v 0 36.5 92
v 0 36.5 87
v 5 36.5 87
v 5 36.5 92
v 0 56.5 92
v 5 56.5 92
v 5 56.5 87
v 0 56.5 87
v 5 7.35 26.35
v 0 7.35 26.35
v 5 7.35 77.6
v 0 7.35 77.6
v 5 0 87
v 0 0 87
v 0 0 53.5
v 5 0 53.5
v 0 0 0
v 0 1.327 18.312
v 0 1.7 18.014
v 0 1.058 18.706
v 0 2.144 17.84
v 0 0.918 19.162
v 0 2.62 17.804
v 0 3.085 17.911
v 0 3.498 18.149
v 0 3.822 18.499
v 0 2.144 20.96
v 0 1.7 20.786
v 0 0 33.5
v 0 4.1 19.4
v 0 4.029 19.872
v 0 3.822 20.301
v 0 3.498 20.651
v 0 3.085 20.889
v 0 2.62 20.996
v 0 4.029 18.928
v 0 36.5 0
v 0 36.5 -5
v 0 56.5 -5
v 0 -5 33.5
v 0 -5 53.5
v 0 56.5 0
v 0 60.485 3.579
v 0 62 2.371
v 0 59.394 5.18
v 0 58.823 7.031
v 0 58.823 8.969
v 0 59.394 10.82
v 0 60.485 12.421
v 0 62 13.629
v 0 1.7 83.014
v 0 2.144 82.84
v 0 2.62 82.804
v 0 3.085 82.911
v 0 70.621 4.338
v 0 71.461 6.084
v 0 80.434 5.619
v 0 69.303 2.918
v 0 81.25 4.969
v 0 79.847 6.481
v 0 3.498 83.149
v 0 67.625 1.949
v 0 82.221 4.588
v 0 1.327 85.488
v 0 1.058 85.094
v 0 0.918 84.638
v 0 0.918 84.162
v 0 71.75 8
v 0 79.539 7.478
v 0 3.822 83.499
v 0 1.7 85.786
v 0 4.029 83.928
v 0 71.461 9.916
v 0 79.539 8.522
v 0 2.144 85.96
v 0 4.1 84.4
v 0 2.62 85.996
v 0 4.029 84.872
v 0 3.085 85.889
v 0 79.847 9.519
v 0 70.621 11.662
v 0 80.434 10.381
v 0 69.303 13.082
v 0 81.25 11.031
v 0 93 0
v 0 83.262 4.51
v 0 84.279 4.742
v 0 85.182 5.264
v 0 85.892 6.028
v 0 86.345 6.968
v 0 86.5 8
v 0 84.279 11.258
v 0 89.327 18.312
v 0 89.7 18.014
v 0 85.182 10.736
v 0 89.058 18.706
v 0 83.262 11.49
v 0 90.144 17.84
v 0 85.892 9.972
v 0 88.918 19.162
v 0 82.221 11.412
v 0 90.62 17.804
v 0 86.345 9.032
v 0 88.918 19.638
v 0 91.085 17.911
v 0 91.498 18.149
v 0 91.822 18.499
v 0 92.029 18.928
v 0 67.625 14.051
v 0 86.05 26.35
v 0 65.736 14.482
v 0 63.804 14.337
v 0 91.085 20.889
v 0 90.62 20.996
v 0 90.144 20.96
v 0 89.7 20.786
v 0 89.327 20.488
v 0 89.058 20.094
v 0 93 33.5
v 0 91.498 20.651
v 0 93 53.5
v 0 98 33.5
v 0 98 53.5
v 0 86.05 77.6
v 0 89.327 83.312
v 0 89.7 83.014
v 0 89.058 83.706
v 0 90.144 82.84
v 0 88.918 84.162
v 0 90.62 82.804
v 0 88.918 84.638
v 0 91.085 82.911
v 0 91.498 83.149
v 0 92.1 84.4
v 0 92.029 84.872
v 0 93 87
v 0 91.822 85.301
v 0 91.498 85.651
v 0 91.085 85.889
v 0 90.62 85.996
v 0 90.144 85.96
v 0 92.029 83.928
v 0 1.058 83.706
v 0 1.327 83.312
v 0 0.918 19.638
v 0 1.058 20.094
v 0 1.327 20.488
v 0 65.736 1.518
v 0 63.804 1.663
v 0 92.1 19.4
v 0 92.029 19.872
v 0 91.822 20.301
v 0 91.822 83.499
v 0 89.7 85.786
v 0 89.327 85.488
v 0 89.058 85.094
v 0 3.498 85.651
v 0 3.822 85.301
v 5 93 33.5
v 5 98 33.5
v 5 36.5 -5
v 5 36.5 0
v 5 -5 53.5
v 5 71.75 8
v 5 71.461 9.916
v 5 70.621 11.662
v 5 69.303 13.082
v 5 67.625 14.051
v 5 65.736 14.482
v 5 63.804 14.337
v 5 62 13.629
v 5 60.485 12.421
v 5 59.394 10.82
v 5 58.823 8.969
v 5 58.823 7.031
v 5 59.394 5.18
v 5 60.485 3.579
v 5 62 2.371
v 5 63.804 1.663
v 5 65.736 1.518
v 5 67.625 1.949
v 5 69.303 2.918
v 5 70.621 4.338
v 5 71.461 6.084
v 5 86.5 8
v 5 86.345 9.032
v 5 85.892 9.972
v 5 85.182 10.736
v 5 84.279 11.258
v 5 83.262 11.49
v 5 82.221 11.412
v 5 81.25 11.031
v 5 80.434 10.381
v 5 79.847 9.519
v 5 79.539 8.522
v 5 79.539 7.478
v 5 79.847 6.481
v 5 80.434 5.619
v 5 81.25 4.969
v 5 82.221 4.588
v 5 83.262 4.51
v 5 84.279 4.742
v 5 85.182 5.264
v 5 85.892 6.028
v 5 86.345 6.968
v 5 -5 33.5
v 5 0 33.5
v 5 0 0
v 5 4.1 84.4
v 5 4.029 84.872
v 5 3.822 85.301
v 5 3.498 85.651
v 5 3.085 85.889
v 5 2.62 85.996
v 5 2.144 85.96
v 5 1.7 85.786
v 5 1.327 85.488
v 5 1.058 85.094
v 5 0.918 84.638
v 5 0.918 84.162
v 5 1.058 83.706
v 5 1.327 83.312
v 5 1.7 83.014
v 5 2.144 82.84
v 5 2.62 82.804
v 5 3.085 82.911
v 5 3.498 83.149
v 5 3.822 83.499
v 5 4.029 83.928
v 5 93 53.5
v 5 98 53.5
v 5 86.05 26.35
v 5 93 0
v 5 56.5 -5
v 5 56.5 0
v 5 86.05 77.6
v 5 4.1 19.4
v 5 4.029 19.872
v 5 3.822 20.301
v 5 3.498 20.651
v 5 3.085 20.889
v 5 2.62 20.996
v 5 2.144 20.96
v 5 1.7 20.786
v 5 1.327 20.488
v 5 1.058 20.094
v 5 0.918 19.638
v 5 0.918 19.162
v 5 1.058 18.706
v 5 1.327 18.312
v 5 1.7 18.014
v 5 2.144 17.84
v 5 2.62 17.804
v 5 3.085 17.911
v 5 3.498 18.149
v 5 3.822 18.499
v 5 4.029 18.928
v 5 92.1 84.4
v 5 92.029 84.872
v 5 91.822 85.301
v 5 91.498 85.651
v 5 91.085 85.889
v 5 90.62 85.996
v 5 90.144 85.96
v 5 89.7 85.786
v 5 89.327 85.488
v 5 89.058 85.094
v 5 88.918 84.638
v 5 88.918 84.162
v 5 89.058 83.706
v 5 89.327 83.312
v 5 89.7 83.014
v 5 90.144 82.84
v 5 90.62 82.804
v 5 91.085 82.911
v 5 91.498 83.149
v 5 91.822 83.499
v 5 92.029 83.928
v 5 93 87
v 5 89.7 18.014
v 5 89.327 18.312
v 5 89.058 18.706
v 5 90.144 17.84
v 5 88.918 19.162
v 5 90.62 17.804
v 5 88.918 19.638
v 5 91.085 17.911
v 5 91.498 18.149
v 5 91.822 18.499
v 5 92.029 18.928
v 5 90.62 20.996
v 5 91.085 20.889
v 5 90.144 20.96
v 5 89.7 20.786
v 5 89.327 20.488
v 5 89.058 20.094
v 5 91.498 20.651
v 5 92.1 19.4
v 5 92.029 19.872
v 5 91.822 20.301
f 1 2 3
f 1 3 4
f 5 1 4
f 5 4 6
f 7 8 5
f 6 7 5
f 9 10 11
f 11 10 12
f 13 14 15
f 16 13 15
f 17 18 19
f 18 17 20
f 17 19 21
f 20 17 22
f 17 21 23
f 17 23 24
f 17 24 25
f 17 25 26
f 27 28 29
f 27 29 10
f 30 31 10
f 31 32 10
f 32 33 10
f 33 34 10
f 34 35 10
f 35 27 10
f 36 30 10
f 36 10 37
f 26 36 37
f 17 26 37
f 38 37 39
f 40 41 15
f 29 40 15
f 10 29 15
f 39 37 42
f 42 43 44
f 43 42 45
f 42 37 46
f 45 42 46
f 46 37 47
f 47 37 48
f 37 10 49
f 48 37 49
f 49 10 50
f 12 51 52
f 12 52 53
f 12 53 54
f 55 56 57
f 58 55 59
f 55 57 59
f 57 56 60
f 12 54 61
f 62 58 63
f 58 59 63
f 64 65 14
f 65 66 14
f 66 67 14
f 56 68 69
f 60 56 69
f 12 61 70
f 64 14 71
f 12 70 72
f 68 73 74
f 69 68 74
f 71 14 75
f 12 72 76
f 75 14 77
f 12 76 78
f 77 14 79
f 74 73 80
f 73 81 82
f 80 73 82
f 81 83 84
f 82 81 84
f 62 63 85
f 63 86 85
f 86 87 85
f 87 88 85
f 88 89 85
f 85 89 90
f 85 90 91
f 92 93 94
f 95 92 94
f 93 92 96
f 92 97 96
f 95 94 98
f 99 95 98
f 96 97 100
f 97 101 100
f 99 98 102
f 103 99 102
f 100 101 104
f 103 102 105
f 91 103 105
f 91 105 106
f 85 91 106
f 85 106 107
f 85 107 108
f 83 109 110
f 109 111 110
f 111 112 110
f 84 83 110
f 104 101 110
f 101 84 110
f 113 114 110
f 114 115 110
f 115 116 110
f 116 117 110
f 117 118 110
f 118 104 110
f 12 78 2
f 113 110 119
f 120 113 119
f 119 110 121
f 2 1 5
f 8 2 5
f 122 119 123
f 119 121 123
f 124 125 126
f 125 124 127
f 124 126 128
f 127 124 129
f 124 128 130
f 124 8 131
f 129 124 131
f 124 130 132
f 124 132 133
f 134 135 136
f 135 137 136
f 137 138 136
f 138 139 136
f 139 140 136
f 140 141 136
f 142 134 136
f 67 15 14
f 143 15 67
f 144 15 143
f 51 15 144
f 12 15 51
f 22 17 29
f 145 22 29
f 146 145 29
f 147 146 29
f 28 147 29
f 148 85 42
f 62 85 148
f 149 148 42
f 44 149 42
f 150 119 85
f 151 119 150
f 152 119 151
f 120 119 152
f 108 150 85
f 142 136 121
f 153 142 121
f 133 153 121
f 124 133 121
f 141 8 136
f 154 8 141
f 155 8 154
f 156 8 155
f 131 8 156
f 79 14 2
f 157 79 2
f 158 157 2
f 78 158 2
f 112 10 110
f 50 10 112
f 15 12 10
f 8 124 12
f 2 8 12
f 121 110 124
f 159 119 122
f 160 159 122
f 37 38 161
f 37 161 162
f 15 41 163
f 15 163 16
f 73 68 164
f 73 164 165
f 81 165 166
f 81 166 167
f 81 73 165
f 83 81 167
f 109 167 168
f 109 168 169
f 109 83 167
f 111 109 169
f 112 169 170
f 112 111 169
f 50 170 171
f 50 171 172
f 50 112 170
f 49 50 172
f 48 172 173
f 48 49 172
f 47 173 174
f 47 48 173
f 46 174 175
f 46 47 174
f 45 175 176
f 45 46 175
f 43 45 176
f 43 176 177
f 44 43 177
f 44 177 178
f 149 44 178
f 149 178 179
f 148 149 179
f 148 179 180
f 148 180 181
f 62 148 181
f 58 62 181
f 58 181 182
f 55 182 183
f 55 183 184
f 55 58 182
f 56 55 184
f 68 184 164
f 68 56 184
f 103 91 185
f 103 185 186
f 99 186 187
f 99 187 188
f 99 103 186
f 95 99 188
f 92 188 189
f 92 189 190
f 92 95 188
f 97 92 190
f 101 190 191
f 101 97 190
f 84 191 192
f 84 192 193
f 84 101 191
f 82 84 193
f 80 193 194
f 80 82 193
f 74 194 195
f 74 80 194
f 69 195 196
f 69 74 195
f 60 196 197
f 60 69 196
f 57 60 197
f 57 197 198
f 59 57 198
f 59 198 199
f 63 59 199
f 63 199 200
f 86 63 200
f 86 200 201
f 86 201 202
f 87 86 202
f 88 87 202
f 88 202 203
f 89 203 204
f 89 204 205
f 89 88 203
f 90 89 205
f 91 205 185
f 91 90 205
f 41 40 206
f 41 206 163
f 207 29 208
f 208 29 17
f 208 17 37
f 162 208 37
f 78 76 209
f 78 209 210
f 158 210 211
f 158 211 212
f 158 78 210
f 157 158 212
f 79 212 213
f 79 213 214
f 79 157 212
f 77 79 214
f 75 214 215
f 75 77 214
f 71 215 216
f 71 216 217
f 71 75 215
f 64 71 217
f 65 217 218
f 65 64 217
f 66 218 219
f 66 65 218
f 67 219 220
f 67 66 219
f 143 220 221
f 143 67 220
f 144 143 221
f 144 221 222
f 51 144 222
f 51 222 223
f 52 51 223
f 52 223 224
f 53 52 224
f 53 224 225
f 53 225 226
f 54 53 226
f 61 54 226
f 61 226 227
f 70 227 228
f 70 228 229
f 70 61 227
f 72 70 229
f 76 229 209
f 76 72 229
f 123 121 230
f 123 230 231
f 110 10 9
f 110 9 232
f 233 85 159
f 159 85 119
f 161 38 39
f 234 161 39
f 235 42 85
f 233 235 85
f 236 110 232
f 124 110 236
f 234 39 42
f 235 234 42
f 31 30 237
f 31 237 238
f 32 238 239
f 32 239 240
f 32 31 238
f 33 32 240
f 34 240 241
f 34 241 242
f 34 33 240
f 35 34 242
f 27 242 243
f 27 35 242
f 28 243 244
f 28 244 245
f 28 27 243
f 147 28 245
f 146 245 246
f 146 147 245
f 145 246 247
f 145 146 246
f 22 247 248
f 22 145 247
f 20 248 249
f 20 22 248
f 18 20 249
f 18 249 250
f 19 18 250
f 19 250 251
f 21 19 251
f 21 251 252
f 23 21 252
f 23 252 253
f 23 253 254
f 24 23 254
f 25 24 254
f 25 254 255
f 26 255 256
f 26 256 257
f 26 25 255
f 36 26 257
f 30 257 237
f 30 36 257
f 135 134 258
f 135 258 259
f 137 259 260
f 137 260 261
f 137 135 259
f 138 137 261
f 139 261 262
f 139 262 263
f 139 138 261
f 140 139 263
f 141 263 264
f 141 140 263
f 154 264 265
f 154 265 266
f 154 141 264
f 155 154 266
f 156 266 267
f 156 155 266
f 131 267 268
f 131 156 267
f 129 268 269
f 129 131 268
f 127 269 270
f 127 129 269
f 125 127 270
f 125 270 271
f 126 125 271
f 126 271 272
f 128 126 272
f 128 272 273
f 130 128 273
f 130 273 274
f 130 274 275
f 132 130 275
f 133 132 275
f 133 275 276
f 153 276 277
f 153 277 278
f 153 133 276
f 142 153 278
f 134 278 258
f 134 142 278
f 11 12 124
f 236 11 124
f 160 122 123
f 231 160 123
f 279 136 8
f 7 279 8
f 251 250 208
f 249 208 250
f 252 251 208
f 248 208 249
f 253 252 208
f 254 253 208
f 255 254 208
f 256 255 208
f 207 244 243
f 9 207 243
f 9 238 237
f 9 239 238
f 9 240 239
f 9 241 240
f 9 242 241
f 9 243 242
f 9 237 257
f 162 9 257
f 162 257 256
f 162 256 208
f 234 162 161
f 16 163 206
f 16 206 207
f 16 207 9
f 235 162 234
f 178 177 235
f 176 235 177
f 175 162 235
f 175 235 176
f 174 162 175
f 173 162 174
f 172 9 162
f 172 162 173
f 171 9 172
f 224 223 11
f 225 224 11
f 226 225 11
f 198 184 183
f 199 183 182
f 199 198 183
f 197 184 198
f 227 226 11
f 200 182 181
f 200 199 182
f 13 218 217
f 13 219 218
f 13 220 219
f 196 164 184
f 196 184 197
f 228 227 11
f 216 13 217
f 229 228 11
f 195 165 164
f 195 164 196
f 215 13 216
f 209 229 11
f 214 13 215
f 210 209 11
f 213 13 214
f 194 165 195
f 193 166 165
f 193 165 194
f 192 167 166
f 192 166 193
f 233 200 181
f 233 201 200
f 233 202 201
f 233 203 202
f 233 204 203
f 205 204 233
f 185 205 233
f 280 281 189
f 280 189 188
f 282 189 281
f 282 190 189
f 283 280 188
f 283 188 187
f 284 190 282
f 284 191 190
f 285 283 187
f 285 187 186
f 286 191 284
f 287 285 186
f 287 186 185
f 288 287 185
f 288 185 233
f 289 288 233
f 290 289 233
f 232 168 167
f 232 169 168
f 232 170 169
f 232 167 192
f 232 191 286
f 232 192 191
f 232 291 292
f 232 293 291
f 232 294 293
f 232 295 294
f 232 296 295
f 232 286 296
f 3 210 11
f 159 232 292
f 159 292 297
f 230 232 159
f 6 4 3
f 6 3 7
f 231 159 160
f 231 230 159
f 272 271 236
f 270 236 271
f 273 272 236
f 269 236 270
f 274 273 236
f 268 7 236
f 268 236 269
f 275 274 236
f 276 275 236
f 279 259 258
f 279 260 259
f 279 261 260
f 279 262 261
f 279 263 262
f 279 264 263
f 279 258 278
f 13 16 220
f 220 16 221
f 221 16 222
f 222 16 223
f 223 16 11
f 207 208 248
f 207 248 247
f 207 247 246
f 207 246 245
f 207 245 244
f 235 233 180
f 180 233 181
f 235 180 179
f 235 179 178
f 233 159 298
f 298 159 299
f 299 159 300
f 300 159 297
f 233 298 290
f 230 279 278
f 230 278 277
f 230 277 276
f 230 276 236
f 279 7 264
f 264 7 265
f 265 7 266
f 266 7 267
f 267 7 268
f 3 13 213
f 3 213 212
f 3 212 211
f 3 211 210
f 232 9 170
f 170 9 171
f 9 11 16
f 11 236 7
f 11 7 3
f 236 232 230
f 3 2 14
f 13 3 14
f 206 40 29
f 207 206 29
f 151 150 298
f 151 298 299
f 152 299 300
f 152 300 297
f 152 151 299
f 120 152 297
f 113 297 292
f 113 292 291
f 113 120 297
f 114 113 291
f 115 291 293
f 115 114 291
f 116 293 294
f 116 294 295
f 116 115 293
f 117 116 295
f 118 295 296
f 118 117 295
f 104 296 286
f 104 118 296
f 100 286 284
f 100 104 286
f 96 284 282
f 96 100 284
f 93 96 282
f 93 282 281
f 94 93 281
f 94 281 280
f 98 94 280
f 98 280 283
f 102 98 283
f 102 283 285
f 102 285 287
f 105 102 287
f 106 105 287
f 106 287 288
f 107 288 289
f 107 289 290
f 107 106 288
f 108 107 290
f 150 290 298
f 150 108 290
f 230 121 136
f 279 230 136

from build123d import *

# Parameters (mm, degrees)
F1_R     = 1.6
F1_R_2   = 6.5
F1_R_3   = 3.5
F1_W     = 78.7
F1_H     = 51.25
F1_W_2   = 20
F1_H_2   = 5
F1_W_3   = 5
F1_H_3   = 20
F2_DEPTH = 5


with BuildPart() as f2:
    # F1 (on Right) → F2 (new body)
    with BuildSketch(Plane.YZ):
        Polygon((36.5, 87), (0, 87), (0, 53.5), (0, 33.5), (0, 0), (36.5, 0), (56.5, 0), (93, 0), (93, 33.5), (93, 53.5), (93, 87), (56.5, 87), align=None)
        with Locations((2.5, 19.4)):
            Circle(F1_R, mode=Mode.SUBTRACT)
        with Locations((65.25, 8)):
            Circle(F1_R_2, mode=Mode.SUBTRACT)
        with Locations((83, 8)):
            Circle(F1_R_3, mode=Mode.SUBTRACT)
        with Locations((90.5, 19.4)):
            Circle(F1_R, mode=Mode.SUBTRACT)
        with Locations((2.5, 84.4)):
            Circle(F1_R, mode=Mode.SUBTRACT)
        with Locations((46.7, 51.975)):
            Rectangle(F1_W, F1_H, mode=Mode.SUBTRACT)
        with Locations((90.5, 84.4)):
            Circle(F1_R, mode=Mode.SUBTRACT)
        with Locations((46.5, 89.5)):
            Rectangle(F1_W_2, F1_H_2)
        with Locations((-2.5, 43.5)):
            Rectangle(F1_W_3, F1_H_3)
        with Locations((95.5, 43.5)):
            Rectangle(F1_W_3, F1_H_3)
        with Locations((46.5, -2.5)):
            Rectangle(F1_W_2, F1_H_2)
    extrude(amount=F2_DEPTH)


solid = f2.part
